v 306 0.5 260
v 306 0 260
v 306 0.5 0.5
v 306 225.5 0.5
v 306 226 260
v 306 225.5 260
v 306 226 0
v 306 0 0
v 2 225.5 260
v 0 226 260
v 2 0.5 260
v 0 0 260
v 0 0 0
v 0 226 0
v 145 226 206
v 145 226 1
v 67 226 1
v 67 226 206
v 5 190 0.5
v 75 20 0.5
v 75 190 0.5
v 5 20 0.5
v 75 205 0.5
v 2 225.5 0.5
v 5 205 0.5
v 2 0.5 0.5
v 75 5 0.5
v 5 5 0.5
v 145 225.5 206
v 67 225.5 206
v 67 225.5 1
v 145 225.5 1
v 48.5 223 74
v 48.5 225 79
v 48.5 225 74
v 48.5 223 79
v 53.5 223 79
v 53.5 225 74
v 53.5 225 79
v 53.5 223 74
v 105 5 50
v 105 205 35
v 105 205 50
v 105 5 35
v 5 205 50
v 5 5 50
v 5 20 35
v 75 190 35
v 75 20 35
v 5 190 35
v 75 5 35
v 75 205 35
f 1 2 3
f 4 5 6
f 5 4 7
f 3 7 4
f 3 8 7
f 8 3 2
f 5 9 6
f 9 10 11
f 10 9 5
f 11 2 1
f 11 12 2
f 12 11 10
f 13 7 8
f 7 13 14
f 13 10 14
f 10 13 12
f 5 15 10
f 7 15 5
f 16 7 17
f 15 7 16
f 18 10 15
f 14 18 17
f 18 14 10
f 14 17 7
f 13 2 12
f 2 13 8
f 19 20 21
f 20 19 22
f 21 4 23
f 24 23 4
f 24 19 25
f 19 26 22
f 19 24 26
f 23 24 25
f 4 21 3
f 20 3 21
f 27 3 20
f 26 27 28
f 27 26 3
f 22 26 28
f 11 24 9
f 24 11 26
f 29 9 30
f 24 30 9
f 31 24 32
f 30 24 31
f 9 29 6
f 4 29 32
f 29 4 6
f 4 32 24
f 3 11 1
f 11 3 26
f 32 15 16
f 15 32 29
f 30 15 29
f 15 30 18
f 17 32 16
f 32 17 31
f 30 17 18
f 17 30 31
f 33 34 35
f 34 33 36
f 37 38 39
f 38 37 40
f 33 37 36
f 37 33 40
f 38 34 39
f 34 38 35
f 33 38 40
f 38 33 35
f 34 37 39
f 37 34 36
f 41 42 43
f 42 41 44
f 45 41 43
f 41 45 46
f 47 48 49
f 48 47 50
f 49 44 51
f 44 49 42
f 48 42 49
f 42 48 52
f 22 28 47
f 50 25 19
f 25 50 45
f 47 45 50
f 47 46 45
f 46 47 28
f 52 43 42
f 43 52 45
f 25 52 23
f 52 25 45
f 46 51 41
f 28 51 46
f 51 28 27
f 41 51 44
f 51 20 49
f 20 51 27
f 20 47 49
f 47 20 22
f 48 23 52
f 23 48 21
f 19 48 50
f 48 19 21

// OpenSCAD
room_width = 225;
room_lenght = 305;
room_height = 260;
door_lenght = 78;
door_height = 205;
door_diff = 67;   // from wall to door
wall_thickness = 1;

module desk(
    show_room = true,
    show_bed = true,
    desk_type

){
    module room() {
        difference() {
            
        color("LightSkyBlue")
        translate( [0, 0, 0])
        cube([room_lenght+wall_thickness, room_width+wall_thickness, room_height]);
          
        //color("LightSkyBlue")  
        translate( [wall_thickness+1, wall_thickness/2, wall_thickness/2])
        cube([room_lenght, room_width, room_height+1]);
            
        //color("LightSkyBlue")
        translate( [door_diff, wall_thickness, wall_thickness])
        cube([door_lenght, room_lenght+wall_thickness, door_height]);
        
        }
    }
    
    module bed() {
        bed_width = 134;
        bed_height = 60;
        color("brown")
        translate( [room_lenght-bed_width, wall_thickness/2, 0])
        cube([bed_width, room_width, bed_height]);
    }
    
    module button() {
        button_size = 5;
        button_death = 2;
        z_position = 74;
        x_position = 48.5;
        color("white")
        translate([x_position, room_width, z_position])
        rotate([90, 0, 0])
        cube([button_size, button_size, button_death]);
    }
    
    module old_desc() {
        locker_death = 44;
        locker_width = 39;
        locker_height = 119;
        box_thickness = 3;
        box_width = 42 - (box_thickness * 2);
        box_togheter = 65;
        box = box_togheter - box_thickness;
        margin = 5;
        difference(){
            linear_extrude(75) {
            points = [[0,0], [70,0], [70,42], [45,42], [45,130], [0,130]];
            paths = [[0, 1, 2, 3, 4, 5, 6]];
            polygon(points = points, paths = paths, convexity = 10);
            }
            for (x = [-1:0])
		    translate ([-10, box_thickness,
            margin + x * box_togheter])
		    cube([
            100, 
            42 - 2*box_thickness,
            box]);
        }
        
        translate([-27-10, 75, 0])
        cube([27, 27, 80]);
        
        color("black")
        translate([-25, 65, 80])
        cube([5, 50, 35]);
    }
    
    module office_desk() {
        thickness = 15;
        height = 50;
        deep = 100;
        width = 200;
        side_deep = 70;
        translate([0, 0, height - thickness])
        cube([deep, width, thickness]);
        
        cube([side_deep, thickness, height - thickness]);
        translate([0, width - thickness, 0])
        cube([side_deep, thickness, height - thickness]);
    }
        
    
    module locker() {
        locker_death = 44;
        locker_width = 39;
        locker_height = 119;
        box_n = 5;
        box_thickness = 3;
        box_width = locker_width - (box_thickness * 2);
        box_togheter = 19;
        box = box_togheter - box_thickness;
        margin = 5;
        difference(){
        cube([locker_death, locker_width, locker_height]);
            for (x = [-1:box_n])
		    translate ([box_thickness/2, box_thickness,
            margin + x * box_togheter])
		    cube([
            locker_death+10, 
            locker_width - 2*box_thickness,
            box]);
        }
    }
        

    button();
    if (show_room) {
        room();
        button();
    }
    if (show_bed) {
        bed();
    }
    
    if (desk_type == "old"){
        translate([42, 15, 0])
        old_desc();
        
        translate([42, 15 + 130, 0])
        locker();
    }
    
        if (desk_type == "office"){
        translate([5, 5, 0])
        color("white")
        office_desk();

    }
}
    
desk(
    show_room=true,
    show_bed=false,
    desk_type="office"
);
